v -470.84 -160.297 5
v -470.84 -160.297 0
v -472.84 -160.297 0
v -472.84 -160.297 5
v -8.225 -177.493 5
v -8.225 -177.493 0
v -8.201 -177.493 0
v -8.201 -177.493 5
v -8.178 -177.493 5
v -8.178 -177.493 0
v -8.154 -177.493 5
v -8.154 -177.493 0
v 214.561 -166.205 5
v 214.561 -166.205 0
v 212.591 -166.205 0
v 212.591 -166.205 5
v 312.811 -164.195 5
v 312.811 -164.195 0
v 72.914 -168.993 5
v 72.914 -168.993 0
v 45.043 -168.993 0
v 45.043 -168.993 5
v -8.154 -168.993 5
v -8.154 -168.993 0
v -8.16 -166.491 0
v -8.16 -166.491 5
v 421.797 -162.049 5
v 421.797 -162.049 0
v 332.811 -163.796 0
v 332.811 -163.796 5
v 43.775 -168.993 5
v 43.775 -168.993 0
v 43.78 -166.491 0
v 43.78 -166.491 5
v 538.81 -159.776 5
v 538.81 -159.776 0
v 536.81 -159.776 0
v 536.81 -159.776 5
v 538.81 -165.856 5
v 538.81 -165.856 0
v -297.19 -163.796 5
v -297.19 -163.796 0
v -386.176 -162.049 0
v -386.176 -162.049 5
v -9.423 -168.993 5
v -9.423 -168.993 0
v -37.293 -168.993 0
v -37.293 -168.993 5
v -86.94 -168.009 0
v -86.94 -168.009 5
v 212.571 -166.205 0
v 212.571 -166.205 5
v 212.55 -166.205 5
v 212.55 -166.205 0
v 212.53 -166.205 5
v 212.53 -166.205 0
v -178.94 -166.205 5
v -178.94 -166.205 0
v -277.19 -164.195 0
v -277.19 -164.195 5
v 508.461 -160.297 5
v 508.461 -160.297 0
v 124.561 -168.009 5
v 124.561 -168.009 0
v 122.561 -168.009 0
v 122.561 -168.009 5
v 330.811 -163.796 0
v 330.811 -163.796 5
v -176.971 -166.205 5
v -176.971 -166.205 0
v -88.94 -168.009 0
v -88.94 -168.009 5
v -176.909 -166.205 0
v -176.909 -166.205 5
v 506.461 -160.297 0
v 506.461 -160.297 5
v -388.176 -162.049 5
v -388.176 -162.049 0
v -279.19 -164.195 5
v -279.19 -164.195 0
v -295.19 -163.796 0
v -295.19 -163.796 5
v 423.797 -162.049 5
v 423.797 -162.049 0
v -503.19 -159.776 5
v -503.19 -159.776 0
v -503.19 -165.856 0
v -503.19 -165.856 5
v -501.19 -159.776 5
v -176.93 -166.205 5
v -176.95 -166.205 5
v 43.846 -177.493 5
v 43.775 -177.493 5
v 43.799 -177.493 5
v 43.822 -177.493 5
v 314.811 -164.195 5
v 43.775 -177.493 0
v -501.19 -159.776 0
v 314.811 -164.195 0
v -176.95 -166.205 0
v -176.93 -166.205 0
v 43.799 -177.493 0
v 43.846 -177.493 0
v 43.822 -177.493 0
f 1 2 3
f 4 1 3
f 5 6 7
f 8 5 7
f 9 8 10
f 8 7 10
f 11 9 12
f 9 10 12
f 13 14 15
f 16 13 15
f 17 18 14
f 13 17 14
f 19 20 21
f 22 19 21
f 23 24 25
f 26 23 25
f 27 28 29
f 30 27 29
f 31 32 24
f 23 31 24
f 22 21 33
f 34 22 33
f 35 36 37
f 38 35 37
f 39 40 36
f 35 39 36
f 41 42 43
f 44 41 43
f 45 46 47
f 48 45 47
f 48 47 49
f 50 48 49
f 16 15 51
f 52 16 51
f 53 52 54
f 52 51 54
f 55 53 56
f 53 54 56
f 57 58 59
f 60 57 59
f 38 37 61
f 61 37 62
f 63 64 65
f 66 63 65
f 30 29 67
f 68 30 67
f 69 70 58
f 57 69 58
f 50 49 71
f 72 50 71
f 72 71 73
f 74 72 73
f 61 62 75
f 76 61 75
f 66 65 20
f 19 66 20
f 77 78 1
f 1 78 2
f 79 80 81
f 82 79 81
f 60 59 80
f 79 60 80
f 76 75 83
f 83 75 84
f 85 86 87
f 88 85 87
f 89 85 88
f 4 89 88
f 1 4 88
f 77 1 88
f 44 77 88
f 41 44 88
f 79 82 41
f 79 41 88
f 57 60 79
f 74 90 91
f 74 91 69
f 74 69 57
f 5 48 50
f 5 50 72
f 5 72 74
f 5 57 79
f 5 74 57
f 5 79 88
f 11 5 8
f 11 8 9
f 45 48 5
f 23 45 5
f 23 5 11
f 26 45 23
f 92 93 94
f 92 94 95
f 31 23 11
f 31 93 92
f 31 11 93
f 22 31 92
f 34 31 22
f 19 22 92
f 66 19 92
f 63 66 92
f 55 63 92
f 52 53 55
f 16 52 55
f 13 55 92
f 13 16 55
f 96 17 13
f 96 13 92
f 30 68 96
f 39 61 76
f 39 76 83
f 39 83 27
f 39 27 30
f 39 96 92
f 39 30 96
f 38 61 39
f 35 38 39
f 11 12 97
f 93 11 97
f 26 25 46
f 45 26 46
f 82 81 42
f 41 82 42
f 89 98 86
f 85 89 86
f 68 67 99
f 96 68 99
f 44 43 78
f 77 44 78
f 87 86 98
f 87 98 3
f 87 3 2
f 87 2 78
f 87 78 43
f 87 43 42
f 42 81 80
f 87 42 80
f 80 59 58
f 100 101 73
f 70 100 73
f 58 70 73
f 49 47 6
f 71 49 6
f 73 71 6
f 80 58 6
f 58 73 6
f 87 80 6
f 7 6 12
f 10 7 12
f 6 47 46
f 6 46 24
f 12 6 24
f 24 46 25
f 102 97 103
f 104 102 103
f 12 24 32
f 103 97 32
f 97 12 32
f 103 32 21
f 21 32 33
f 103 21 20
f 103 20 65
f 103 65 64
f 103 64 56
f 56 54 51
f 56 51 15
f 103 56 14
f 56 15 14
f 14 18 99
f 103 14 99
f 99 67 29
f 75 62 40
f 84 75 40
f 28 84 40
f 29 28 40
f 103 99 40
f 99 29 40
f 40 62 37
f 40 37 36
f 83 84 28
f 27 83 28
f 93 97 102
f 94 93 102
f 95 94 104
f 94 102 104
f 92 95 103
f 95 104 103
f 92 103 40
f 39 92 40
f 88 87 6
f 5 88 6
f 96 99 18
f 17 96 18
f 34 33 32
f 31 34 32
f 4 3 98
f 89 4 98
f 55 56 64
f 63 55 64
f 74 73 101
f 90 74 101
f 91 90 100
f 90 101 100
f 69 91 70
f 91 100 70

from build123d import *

# Parameters (mm, degrees)
EXTRUDE_1_DEPTH = 5


with BuildPart() as part:
    # Model → 凸台-拉伸1 (new body)
    with BuildSketch(Plane.XY):
        with BuildLine():
            Line((43.845523177, -177.492582663), (538.81027344, -165.856176204))
            Line((538.81027344, -165.856176204), (538.81027344, -159.776195336))
            Line((538.81027344, -159.776195336), (536.81027344, -159.776195336))
            Line((536.81027344, -159.776195336), (508.460943442, -160.297194912))
            Line((508.460943442, -160.297194912), (506.460943442, -160.297194912))
            Line((506.460943442, -160.297194912), (423.796625507, -162.048616282))
            Line((423.796625507, -162.048616282), (421.796625507, -162.048616282))
            Line((421.796625507, -162.048616282), (332.810549536, -163.795959439))
            Line((332.810549536, -163.795959439), (330.810549536, -163.795959439))
            Line((330.810549536, -163.795959439), (314.810549536, -164.194907743))
            Line((314.810549536, -164.194907743), (312.810549536, -164.194907743))
            Line((312.810549536, -164.194907743), (214.560628282, -166.204763766))
            Line((214.560628282, -166.204763766), (212.591381202, -166.204763766))
            ThreePointArc((212.591381202, -166.204763766), (212.560629898, -166.204921378), (212.529881824, -166.205394195))
            Line((212.529881824, -166.205394195), (124.560628282, -168.009124705))
            Line((124.560628282, -168.009124705), (122.560628282, -168.009124705))
            Line((122.560628282, -168.009124705), (72.913804388, -168.993411369))
            Line((72.913804388, -168.993411369), (45.043435184, -168.993411369))
            Line((45.043435184, -168.993411369), (43.780250092, -166.49051255))
            Line((43.780250092, -166.49051255), (43.775013962, -168.993411369))
            Line((43.775013962, -168.993411369), (17.81027344, -168.993411369))
            Line((17.81027344, -168.993411369), (-8.154467083, -168.993411369))
            Line((-8.154467083, -168.993411369), (-8.159703213, -166.49051255))
            Line((-8.159703213, -166.49051255), (-9.422888304, -168.993411369))
            Line((-9.422888304, -168.993411369), (-37.293257509, -168.993411369))
            Line((-37.293257509, -168.993411369), (-86.940081403, -168.009124705))
            Line((-86.940081403, -168.009124705), (-88.940081403, -168.009124705))
            Line((-88.940081403, -168.009124705), (-176.909334945, -166.205394195))
            ThreePointArc((-176.909334945, -166.205394195), (-176.940083018, -166.204921378), (-176.970834323, -166.204763766))
            Line((-176.970834323, -166.204763766), (-178.940081403, -166.204763766))
            Line((-178.940081403, -166.204763766), (-277.190002657, -164.194907743))
            Line((-277.190002657, -164.194907743), (-279.190002657, -164.194907743))
            Line((-279.190002657, -164.194907743), (-295.190002657, -163.795959439))
            Line((-295.190002657, -163.795959439), (-297.190002657, -163.795959439))
            Line((-297.190002657, -163.795959439), (-386.176078628, -162.048616282))
            Line((-386.176078628, -162.048616282), (-388.176078628, -162.048616282))
            Line((-388.176078628, -162.048616282), (-470.840396563, -160.297194912))
            Line((-470.840396563, -160.297194912), (-472.840396563, -160.297194912))
            Line((-472.840396563, -160.297194912), (-501.18972656, -159.776195336))
            Line((-501.18972656, -159.776195336), (-503.18972656, -159.776195336))
            Line((-503.18972656, -159.776195336), (-503.18972656, -165.856176204))
            Line((-503.18972656, -165.856176204), (-8.224976298, -177.492582663))
            ThreePointArc((-8.224976298, -177.492582663), (-8.189724125, -177.493204186), (-8.154467083, -177.493411369))
            Line((-8.154467083, -177.493411369), (17.81027344, -177.493411369))
            Line((17.81027344, -177.493411369), (43.775013962, -177.493411369))
            ThreePointArc((43.775013962, -177.493411369), (43.810271005, -177.493204186), (43.845523177, -177.492582663))
        make_face()
    extrude(amount=EXTRUDE_1_DEPTH)


solid = part.part
